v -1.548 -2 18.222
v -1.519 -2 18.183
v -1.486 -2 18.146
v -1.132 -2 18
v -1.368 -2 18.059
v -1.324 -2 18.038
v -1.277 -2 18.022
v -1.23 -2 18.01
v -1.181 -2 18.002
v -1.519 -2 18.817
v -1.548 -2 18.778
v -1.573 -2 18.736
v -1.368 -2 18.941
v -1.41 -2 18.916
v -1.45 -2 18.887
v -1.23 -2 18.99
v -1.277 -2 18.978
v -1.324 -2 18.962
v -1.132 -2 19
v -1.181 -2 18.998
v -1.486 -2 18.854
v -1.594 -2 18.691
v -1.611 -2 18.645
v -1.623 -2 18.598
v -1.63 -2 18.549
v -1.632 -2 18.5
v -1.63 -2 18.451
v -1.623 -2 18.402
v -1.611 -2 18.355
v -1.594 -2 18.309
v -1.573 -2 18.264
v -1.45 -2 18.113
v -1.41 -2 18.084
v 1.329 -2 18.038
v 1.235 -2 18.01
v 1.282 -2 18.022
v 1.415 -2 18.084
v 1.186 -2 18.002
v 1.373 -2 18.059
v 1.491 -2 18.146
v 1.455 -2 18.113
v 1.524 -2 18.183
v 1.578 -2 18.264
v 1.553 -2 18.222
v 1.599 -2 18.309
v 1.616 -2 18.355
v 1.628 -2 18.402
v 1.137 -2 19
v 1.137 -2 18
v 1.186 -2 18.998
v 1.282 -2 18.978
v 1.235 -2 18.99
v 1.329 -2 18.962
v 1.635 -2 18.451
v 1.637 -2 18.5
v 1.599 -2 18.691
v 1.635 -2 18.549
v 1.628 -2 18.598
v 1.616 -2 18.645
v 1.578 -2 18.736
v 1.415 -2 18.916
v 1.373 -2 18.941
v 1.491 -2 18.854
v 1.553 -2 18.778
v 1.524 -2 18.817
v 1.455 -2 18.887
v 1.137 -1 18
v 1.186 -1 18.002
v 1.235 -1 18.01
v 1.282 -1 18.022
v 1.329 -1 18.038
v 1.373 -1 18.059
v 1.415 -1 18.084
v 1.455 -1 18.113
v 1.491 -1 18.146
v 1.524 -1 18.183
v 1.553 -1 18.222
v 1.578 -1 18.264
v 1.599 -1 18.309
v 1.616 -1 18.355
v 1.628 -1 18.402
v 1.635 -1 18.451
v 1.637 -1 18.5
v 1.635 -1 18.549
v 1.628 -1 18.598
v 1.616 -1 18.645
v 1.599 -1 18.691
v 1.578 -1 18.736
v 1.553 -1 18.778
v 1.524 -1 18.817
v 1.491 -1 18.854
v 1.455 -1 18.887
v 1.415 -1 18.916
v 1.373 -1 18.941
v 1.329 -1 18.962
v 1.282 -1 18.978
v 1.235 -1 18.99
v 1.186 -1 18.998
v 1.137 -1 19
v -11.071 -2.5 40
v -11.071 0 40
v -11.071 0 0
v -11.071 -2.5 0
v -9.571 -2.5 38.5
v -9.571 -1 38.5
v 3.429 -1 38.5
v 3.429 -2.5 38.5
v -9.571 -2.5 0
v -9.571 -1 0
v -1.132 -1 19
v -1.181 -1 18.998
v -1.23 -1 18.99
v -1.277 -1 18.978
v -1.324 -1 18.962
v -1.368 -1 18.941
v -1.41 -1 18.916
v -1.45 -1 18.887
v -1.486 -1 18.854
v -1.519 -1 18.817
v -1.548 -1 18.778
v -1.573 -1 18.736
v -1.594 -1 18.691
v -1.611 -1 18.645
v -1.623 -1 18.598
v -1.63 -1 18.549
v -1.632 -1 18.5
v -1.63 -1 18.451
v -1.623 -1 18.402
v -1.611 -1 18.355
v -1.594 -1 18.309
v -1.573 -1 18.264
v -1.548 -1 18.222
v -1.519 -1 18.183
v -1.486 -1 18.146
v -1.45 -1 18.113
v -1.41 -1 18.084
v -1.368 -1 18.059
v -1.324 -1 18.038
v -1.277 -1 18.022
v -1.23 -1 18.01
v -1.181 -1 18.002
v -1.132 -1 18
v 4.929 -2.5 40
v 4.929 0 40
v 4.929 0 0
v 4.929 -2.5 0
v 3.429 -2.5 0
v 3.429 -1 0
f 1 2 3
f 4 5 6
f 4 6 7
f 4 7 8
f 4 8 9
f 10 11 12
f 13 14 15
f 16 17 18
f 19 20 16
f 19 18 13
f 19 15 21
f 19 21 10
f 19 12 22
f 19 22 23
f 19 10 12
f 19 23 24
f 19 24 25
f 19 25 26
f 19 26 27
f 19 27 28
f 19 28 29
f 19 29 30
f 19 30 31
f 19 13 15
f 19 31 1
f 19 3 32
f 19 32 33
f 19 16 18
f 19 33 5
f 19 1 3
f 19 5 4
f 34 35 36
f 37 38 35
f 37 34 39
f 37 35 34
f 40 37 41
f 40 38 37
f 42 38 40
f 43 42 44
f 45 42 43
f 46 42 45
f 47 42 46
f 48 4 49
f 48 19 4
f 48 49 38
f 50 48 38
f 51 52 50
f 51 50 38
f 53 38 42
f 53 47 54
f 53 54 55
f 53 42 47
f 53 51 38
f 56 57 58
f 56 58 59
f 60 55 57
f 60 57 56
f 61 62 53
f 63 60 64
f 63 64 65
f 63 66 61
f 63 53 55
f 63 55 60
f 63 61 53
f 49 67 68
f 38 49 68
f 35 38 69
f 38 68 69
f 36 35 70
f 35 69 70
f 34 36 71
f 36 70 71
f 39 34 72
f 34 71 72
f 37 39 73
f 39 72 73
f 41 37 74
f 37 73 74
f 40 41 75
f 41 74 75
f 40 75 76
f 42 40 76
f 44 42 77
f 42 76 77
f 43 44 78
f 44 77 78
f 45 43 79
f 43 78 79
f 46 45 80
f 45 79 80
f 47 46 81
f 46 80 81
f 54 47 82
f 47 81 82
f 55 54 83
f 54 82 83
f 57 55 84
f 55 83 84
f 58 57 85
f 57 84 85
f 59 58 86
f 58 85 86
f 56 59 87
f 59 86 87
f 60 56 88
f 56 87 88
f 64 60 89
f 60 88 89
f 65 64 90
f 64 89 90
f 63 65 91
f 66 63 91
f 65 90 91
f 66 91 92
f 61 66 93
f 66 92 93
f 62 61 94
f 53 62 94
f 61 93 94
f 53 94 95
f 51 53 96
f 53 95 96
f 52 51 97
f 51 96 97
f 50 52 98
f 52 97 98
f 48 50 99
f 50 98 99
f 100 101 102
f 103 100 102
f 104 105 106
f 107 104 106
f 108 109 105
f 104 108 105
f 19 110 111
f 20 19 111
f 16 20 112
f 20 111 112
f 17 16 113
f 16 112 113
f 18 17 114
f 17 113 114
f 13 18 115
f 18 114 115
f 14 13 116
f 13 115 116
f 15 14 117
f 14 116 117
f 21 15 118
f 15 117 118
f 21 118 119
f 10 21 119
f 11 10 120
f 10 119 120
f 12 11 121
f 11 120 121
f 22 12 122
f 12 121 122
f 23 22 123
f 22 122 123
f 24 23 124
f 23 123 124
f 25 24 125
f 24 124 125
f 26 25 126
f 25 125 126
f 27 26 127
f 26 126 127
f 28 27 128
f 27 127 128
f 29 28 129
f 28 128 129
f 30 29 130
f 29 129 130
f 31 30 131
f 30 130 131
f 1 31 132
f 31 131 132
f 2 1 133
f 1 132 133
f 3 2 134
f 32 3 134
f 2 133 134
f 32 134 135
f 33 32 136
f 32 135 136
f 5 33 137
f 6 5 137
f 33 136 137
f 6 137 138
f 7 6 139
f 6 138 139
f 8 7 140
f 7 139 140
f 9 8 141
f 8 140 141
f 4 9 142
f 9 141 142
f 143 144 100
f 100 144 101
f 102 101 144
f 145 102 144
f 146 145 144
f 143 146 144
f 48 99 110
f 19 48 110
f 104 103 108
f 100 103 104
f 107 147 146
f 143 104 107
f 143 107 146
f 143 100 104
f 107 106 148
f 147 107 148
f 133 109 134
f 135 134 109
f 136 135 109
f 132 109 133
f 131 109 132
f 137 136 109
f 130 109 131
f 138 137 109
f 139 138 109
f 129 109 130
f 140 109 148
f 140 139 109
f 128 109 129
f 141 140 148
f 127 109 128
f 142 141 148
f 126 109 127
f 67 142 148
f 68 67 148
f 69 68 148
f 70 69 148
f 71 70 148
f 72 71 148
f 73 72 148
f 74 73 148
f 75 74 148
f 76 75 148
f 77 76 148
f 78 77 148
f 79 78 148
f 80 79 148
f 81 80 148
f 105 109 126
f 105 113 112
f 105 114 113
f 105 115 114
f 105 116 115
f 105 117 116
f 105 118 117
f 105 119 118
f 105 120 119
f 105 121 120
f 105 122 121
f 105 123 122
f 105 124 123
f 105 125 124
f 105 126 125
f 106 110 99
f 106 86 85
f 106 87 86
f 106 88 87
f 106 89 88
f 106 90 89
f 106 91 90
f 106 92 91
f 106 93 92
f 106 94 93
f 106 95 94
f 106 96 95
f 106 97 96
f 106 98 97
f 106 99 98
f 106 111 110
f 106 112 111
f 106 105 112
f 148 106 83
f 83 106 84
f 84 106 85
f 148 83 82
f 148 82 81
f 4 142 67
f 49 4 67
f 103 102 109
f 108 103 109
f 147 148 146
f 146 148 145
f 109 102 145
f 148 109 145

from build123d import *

# Parameters (mm, degrees)
F1_DEPTH = 2.5
F0_W     = 13
F0_H     = 38.5
F2_DEPTH = 1
F4_DEPTH = 1


with BuildPart() as f1:
    # F0 (on Front) → F1 (new body)
    with BuildSketch(Plane.XZ):
        Polygon((-11.071428, 40), (-11.071428, 0), (-9.571428, 0), (-9.571428, 38.5), (3.428572, 38.5), (3.428572, 0), (4.928572, 0), (4.928572, 40), align=None)
    extrude(amount=F1_DEPTH)

    # F0 (on Front) → F2 (join)
    with BuildSketch(Plane.XZ):
        with Locations((-3.071428, 19.25)):
            Rectangle(F0_W, F0_H)
    extrude(amount=F2_DEPTH)

    # F3 (on face) → F4 (join)
    with BuildSketch(Plane.XZ.offset(1)):
        with BuildLine():
            Line((1.137349, 19), (-1.132357, 19))
            ThreePointArc((-1.132357, 19), (-1.632357, 18.5), (-1.132357, 18))
            Line((-1.132357, 18), (1.137349, 18))
            ThreePointArc((1.137349, 18), (1.637349, 18.5), (1.137349, 19))
        make_face()
    extrude(amount=F4_DEPTH)


solid = f1.part
